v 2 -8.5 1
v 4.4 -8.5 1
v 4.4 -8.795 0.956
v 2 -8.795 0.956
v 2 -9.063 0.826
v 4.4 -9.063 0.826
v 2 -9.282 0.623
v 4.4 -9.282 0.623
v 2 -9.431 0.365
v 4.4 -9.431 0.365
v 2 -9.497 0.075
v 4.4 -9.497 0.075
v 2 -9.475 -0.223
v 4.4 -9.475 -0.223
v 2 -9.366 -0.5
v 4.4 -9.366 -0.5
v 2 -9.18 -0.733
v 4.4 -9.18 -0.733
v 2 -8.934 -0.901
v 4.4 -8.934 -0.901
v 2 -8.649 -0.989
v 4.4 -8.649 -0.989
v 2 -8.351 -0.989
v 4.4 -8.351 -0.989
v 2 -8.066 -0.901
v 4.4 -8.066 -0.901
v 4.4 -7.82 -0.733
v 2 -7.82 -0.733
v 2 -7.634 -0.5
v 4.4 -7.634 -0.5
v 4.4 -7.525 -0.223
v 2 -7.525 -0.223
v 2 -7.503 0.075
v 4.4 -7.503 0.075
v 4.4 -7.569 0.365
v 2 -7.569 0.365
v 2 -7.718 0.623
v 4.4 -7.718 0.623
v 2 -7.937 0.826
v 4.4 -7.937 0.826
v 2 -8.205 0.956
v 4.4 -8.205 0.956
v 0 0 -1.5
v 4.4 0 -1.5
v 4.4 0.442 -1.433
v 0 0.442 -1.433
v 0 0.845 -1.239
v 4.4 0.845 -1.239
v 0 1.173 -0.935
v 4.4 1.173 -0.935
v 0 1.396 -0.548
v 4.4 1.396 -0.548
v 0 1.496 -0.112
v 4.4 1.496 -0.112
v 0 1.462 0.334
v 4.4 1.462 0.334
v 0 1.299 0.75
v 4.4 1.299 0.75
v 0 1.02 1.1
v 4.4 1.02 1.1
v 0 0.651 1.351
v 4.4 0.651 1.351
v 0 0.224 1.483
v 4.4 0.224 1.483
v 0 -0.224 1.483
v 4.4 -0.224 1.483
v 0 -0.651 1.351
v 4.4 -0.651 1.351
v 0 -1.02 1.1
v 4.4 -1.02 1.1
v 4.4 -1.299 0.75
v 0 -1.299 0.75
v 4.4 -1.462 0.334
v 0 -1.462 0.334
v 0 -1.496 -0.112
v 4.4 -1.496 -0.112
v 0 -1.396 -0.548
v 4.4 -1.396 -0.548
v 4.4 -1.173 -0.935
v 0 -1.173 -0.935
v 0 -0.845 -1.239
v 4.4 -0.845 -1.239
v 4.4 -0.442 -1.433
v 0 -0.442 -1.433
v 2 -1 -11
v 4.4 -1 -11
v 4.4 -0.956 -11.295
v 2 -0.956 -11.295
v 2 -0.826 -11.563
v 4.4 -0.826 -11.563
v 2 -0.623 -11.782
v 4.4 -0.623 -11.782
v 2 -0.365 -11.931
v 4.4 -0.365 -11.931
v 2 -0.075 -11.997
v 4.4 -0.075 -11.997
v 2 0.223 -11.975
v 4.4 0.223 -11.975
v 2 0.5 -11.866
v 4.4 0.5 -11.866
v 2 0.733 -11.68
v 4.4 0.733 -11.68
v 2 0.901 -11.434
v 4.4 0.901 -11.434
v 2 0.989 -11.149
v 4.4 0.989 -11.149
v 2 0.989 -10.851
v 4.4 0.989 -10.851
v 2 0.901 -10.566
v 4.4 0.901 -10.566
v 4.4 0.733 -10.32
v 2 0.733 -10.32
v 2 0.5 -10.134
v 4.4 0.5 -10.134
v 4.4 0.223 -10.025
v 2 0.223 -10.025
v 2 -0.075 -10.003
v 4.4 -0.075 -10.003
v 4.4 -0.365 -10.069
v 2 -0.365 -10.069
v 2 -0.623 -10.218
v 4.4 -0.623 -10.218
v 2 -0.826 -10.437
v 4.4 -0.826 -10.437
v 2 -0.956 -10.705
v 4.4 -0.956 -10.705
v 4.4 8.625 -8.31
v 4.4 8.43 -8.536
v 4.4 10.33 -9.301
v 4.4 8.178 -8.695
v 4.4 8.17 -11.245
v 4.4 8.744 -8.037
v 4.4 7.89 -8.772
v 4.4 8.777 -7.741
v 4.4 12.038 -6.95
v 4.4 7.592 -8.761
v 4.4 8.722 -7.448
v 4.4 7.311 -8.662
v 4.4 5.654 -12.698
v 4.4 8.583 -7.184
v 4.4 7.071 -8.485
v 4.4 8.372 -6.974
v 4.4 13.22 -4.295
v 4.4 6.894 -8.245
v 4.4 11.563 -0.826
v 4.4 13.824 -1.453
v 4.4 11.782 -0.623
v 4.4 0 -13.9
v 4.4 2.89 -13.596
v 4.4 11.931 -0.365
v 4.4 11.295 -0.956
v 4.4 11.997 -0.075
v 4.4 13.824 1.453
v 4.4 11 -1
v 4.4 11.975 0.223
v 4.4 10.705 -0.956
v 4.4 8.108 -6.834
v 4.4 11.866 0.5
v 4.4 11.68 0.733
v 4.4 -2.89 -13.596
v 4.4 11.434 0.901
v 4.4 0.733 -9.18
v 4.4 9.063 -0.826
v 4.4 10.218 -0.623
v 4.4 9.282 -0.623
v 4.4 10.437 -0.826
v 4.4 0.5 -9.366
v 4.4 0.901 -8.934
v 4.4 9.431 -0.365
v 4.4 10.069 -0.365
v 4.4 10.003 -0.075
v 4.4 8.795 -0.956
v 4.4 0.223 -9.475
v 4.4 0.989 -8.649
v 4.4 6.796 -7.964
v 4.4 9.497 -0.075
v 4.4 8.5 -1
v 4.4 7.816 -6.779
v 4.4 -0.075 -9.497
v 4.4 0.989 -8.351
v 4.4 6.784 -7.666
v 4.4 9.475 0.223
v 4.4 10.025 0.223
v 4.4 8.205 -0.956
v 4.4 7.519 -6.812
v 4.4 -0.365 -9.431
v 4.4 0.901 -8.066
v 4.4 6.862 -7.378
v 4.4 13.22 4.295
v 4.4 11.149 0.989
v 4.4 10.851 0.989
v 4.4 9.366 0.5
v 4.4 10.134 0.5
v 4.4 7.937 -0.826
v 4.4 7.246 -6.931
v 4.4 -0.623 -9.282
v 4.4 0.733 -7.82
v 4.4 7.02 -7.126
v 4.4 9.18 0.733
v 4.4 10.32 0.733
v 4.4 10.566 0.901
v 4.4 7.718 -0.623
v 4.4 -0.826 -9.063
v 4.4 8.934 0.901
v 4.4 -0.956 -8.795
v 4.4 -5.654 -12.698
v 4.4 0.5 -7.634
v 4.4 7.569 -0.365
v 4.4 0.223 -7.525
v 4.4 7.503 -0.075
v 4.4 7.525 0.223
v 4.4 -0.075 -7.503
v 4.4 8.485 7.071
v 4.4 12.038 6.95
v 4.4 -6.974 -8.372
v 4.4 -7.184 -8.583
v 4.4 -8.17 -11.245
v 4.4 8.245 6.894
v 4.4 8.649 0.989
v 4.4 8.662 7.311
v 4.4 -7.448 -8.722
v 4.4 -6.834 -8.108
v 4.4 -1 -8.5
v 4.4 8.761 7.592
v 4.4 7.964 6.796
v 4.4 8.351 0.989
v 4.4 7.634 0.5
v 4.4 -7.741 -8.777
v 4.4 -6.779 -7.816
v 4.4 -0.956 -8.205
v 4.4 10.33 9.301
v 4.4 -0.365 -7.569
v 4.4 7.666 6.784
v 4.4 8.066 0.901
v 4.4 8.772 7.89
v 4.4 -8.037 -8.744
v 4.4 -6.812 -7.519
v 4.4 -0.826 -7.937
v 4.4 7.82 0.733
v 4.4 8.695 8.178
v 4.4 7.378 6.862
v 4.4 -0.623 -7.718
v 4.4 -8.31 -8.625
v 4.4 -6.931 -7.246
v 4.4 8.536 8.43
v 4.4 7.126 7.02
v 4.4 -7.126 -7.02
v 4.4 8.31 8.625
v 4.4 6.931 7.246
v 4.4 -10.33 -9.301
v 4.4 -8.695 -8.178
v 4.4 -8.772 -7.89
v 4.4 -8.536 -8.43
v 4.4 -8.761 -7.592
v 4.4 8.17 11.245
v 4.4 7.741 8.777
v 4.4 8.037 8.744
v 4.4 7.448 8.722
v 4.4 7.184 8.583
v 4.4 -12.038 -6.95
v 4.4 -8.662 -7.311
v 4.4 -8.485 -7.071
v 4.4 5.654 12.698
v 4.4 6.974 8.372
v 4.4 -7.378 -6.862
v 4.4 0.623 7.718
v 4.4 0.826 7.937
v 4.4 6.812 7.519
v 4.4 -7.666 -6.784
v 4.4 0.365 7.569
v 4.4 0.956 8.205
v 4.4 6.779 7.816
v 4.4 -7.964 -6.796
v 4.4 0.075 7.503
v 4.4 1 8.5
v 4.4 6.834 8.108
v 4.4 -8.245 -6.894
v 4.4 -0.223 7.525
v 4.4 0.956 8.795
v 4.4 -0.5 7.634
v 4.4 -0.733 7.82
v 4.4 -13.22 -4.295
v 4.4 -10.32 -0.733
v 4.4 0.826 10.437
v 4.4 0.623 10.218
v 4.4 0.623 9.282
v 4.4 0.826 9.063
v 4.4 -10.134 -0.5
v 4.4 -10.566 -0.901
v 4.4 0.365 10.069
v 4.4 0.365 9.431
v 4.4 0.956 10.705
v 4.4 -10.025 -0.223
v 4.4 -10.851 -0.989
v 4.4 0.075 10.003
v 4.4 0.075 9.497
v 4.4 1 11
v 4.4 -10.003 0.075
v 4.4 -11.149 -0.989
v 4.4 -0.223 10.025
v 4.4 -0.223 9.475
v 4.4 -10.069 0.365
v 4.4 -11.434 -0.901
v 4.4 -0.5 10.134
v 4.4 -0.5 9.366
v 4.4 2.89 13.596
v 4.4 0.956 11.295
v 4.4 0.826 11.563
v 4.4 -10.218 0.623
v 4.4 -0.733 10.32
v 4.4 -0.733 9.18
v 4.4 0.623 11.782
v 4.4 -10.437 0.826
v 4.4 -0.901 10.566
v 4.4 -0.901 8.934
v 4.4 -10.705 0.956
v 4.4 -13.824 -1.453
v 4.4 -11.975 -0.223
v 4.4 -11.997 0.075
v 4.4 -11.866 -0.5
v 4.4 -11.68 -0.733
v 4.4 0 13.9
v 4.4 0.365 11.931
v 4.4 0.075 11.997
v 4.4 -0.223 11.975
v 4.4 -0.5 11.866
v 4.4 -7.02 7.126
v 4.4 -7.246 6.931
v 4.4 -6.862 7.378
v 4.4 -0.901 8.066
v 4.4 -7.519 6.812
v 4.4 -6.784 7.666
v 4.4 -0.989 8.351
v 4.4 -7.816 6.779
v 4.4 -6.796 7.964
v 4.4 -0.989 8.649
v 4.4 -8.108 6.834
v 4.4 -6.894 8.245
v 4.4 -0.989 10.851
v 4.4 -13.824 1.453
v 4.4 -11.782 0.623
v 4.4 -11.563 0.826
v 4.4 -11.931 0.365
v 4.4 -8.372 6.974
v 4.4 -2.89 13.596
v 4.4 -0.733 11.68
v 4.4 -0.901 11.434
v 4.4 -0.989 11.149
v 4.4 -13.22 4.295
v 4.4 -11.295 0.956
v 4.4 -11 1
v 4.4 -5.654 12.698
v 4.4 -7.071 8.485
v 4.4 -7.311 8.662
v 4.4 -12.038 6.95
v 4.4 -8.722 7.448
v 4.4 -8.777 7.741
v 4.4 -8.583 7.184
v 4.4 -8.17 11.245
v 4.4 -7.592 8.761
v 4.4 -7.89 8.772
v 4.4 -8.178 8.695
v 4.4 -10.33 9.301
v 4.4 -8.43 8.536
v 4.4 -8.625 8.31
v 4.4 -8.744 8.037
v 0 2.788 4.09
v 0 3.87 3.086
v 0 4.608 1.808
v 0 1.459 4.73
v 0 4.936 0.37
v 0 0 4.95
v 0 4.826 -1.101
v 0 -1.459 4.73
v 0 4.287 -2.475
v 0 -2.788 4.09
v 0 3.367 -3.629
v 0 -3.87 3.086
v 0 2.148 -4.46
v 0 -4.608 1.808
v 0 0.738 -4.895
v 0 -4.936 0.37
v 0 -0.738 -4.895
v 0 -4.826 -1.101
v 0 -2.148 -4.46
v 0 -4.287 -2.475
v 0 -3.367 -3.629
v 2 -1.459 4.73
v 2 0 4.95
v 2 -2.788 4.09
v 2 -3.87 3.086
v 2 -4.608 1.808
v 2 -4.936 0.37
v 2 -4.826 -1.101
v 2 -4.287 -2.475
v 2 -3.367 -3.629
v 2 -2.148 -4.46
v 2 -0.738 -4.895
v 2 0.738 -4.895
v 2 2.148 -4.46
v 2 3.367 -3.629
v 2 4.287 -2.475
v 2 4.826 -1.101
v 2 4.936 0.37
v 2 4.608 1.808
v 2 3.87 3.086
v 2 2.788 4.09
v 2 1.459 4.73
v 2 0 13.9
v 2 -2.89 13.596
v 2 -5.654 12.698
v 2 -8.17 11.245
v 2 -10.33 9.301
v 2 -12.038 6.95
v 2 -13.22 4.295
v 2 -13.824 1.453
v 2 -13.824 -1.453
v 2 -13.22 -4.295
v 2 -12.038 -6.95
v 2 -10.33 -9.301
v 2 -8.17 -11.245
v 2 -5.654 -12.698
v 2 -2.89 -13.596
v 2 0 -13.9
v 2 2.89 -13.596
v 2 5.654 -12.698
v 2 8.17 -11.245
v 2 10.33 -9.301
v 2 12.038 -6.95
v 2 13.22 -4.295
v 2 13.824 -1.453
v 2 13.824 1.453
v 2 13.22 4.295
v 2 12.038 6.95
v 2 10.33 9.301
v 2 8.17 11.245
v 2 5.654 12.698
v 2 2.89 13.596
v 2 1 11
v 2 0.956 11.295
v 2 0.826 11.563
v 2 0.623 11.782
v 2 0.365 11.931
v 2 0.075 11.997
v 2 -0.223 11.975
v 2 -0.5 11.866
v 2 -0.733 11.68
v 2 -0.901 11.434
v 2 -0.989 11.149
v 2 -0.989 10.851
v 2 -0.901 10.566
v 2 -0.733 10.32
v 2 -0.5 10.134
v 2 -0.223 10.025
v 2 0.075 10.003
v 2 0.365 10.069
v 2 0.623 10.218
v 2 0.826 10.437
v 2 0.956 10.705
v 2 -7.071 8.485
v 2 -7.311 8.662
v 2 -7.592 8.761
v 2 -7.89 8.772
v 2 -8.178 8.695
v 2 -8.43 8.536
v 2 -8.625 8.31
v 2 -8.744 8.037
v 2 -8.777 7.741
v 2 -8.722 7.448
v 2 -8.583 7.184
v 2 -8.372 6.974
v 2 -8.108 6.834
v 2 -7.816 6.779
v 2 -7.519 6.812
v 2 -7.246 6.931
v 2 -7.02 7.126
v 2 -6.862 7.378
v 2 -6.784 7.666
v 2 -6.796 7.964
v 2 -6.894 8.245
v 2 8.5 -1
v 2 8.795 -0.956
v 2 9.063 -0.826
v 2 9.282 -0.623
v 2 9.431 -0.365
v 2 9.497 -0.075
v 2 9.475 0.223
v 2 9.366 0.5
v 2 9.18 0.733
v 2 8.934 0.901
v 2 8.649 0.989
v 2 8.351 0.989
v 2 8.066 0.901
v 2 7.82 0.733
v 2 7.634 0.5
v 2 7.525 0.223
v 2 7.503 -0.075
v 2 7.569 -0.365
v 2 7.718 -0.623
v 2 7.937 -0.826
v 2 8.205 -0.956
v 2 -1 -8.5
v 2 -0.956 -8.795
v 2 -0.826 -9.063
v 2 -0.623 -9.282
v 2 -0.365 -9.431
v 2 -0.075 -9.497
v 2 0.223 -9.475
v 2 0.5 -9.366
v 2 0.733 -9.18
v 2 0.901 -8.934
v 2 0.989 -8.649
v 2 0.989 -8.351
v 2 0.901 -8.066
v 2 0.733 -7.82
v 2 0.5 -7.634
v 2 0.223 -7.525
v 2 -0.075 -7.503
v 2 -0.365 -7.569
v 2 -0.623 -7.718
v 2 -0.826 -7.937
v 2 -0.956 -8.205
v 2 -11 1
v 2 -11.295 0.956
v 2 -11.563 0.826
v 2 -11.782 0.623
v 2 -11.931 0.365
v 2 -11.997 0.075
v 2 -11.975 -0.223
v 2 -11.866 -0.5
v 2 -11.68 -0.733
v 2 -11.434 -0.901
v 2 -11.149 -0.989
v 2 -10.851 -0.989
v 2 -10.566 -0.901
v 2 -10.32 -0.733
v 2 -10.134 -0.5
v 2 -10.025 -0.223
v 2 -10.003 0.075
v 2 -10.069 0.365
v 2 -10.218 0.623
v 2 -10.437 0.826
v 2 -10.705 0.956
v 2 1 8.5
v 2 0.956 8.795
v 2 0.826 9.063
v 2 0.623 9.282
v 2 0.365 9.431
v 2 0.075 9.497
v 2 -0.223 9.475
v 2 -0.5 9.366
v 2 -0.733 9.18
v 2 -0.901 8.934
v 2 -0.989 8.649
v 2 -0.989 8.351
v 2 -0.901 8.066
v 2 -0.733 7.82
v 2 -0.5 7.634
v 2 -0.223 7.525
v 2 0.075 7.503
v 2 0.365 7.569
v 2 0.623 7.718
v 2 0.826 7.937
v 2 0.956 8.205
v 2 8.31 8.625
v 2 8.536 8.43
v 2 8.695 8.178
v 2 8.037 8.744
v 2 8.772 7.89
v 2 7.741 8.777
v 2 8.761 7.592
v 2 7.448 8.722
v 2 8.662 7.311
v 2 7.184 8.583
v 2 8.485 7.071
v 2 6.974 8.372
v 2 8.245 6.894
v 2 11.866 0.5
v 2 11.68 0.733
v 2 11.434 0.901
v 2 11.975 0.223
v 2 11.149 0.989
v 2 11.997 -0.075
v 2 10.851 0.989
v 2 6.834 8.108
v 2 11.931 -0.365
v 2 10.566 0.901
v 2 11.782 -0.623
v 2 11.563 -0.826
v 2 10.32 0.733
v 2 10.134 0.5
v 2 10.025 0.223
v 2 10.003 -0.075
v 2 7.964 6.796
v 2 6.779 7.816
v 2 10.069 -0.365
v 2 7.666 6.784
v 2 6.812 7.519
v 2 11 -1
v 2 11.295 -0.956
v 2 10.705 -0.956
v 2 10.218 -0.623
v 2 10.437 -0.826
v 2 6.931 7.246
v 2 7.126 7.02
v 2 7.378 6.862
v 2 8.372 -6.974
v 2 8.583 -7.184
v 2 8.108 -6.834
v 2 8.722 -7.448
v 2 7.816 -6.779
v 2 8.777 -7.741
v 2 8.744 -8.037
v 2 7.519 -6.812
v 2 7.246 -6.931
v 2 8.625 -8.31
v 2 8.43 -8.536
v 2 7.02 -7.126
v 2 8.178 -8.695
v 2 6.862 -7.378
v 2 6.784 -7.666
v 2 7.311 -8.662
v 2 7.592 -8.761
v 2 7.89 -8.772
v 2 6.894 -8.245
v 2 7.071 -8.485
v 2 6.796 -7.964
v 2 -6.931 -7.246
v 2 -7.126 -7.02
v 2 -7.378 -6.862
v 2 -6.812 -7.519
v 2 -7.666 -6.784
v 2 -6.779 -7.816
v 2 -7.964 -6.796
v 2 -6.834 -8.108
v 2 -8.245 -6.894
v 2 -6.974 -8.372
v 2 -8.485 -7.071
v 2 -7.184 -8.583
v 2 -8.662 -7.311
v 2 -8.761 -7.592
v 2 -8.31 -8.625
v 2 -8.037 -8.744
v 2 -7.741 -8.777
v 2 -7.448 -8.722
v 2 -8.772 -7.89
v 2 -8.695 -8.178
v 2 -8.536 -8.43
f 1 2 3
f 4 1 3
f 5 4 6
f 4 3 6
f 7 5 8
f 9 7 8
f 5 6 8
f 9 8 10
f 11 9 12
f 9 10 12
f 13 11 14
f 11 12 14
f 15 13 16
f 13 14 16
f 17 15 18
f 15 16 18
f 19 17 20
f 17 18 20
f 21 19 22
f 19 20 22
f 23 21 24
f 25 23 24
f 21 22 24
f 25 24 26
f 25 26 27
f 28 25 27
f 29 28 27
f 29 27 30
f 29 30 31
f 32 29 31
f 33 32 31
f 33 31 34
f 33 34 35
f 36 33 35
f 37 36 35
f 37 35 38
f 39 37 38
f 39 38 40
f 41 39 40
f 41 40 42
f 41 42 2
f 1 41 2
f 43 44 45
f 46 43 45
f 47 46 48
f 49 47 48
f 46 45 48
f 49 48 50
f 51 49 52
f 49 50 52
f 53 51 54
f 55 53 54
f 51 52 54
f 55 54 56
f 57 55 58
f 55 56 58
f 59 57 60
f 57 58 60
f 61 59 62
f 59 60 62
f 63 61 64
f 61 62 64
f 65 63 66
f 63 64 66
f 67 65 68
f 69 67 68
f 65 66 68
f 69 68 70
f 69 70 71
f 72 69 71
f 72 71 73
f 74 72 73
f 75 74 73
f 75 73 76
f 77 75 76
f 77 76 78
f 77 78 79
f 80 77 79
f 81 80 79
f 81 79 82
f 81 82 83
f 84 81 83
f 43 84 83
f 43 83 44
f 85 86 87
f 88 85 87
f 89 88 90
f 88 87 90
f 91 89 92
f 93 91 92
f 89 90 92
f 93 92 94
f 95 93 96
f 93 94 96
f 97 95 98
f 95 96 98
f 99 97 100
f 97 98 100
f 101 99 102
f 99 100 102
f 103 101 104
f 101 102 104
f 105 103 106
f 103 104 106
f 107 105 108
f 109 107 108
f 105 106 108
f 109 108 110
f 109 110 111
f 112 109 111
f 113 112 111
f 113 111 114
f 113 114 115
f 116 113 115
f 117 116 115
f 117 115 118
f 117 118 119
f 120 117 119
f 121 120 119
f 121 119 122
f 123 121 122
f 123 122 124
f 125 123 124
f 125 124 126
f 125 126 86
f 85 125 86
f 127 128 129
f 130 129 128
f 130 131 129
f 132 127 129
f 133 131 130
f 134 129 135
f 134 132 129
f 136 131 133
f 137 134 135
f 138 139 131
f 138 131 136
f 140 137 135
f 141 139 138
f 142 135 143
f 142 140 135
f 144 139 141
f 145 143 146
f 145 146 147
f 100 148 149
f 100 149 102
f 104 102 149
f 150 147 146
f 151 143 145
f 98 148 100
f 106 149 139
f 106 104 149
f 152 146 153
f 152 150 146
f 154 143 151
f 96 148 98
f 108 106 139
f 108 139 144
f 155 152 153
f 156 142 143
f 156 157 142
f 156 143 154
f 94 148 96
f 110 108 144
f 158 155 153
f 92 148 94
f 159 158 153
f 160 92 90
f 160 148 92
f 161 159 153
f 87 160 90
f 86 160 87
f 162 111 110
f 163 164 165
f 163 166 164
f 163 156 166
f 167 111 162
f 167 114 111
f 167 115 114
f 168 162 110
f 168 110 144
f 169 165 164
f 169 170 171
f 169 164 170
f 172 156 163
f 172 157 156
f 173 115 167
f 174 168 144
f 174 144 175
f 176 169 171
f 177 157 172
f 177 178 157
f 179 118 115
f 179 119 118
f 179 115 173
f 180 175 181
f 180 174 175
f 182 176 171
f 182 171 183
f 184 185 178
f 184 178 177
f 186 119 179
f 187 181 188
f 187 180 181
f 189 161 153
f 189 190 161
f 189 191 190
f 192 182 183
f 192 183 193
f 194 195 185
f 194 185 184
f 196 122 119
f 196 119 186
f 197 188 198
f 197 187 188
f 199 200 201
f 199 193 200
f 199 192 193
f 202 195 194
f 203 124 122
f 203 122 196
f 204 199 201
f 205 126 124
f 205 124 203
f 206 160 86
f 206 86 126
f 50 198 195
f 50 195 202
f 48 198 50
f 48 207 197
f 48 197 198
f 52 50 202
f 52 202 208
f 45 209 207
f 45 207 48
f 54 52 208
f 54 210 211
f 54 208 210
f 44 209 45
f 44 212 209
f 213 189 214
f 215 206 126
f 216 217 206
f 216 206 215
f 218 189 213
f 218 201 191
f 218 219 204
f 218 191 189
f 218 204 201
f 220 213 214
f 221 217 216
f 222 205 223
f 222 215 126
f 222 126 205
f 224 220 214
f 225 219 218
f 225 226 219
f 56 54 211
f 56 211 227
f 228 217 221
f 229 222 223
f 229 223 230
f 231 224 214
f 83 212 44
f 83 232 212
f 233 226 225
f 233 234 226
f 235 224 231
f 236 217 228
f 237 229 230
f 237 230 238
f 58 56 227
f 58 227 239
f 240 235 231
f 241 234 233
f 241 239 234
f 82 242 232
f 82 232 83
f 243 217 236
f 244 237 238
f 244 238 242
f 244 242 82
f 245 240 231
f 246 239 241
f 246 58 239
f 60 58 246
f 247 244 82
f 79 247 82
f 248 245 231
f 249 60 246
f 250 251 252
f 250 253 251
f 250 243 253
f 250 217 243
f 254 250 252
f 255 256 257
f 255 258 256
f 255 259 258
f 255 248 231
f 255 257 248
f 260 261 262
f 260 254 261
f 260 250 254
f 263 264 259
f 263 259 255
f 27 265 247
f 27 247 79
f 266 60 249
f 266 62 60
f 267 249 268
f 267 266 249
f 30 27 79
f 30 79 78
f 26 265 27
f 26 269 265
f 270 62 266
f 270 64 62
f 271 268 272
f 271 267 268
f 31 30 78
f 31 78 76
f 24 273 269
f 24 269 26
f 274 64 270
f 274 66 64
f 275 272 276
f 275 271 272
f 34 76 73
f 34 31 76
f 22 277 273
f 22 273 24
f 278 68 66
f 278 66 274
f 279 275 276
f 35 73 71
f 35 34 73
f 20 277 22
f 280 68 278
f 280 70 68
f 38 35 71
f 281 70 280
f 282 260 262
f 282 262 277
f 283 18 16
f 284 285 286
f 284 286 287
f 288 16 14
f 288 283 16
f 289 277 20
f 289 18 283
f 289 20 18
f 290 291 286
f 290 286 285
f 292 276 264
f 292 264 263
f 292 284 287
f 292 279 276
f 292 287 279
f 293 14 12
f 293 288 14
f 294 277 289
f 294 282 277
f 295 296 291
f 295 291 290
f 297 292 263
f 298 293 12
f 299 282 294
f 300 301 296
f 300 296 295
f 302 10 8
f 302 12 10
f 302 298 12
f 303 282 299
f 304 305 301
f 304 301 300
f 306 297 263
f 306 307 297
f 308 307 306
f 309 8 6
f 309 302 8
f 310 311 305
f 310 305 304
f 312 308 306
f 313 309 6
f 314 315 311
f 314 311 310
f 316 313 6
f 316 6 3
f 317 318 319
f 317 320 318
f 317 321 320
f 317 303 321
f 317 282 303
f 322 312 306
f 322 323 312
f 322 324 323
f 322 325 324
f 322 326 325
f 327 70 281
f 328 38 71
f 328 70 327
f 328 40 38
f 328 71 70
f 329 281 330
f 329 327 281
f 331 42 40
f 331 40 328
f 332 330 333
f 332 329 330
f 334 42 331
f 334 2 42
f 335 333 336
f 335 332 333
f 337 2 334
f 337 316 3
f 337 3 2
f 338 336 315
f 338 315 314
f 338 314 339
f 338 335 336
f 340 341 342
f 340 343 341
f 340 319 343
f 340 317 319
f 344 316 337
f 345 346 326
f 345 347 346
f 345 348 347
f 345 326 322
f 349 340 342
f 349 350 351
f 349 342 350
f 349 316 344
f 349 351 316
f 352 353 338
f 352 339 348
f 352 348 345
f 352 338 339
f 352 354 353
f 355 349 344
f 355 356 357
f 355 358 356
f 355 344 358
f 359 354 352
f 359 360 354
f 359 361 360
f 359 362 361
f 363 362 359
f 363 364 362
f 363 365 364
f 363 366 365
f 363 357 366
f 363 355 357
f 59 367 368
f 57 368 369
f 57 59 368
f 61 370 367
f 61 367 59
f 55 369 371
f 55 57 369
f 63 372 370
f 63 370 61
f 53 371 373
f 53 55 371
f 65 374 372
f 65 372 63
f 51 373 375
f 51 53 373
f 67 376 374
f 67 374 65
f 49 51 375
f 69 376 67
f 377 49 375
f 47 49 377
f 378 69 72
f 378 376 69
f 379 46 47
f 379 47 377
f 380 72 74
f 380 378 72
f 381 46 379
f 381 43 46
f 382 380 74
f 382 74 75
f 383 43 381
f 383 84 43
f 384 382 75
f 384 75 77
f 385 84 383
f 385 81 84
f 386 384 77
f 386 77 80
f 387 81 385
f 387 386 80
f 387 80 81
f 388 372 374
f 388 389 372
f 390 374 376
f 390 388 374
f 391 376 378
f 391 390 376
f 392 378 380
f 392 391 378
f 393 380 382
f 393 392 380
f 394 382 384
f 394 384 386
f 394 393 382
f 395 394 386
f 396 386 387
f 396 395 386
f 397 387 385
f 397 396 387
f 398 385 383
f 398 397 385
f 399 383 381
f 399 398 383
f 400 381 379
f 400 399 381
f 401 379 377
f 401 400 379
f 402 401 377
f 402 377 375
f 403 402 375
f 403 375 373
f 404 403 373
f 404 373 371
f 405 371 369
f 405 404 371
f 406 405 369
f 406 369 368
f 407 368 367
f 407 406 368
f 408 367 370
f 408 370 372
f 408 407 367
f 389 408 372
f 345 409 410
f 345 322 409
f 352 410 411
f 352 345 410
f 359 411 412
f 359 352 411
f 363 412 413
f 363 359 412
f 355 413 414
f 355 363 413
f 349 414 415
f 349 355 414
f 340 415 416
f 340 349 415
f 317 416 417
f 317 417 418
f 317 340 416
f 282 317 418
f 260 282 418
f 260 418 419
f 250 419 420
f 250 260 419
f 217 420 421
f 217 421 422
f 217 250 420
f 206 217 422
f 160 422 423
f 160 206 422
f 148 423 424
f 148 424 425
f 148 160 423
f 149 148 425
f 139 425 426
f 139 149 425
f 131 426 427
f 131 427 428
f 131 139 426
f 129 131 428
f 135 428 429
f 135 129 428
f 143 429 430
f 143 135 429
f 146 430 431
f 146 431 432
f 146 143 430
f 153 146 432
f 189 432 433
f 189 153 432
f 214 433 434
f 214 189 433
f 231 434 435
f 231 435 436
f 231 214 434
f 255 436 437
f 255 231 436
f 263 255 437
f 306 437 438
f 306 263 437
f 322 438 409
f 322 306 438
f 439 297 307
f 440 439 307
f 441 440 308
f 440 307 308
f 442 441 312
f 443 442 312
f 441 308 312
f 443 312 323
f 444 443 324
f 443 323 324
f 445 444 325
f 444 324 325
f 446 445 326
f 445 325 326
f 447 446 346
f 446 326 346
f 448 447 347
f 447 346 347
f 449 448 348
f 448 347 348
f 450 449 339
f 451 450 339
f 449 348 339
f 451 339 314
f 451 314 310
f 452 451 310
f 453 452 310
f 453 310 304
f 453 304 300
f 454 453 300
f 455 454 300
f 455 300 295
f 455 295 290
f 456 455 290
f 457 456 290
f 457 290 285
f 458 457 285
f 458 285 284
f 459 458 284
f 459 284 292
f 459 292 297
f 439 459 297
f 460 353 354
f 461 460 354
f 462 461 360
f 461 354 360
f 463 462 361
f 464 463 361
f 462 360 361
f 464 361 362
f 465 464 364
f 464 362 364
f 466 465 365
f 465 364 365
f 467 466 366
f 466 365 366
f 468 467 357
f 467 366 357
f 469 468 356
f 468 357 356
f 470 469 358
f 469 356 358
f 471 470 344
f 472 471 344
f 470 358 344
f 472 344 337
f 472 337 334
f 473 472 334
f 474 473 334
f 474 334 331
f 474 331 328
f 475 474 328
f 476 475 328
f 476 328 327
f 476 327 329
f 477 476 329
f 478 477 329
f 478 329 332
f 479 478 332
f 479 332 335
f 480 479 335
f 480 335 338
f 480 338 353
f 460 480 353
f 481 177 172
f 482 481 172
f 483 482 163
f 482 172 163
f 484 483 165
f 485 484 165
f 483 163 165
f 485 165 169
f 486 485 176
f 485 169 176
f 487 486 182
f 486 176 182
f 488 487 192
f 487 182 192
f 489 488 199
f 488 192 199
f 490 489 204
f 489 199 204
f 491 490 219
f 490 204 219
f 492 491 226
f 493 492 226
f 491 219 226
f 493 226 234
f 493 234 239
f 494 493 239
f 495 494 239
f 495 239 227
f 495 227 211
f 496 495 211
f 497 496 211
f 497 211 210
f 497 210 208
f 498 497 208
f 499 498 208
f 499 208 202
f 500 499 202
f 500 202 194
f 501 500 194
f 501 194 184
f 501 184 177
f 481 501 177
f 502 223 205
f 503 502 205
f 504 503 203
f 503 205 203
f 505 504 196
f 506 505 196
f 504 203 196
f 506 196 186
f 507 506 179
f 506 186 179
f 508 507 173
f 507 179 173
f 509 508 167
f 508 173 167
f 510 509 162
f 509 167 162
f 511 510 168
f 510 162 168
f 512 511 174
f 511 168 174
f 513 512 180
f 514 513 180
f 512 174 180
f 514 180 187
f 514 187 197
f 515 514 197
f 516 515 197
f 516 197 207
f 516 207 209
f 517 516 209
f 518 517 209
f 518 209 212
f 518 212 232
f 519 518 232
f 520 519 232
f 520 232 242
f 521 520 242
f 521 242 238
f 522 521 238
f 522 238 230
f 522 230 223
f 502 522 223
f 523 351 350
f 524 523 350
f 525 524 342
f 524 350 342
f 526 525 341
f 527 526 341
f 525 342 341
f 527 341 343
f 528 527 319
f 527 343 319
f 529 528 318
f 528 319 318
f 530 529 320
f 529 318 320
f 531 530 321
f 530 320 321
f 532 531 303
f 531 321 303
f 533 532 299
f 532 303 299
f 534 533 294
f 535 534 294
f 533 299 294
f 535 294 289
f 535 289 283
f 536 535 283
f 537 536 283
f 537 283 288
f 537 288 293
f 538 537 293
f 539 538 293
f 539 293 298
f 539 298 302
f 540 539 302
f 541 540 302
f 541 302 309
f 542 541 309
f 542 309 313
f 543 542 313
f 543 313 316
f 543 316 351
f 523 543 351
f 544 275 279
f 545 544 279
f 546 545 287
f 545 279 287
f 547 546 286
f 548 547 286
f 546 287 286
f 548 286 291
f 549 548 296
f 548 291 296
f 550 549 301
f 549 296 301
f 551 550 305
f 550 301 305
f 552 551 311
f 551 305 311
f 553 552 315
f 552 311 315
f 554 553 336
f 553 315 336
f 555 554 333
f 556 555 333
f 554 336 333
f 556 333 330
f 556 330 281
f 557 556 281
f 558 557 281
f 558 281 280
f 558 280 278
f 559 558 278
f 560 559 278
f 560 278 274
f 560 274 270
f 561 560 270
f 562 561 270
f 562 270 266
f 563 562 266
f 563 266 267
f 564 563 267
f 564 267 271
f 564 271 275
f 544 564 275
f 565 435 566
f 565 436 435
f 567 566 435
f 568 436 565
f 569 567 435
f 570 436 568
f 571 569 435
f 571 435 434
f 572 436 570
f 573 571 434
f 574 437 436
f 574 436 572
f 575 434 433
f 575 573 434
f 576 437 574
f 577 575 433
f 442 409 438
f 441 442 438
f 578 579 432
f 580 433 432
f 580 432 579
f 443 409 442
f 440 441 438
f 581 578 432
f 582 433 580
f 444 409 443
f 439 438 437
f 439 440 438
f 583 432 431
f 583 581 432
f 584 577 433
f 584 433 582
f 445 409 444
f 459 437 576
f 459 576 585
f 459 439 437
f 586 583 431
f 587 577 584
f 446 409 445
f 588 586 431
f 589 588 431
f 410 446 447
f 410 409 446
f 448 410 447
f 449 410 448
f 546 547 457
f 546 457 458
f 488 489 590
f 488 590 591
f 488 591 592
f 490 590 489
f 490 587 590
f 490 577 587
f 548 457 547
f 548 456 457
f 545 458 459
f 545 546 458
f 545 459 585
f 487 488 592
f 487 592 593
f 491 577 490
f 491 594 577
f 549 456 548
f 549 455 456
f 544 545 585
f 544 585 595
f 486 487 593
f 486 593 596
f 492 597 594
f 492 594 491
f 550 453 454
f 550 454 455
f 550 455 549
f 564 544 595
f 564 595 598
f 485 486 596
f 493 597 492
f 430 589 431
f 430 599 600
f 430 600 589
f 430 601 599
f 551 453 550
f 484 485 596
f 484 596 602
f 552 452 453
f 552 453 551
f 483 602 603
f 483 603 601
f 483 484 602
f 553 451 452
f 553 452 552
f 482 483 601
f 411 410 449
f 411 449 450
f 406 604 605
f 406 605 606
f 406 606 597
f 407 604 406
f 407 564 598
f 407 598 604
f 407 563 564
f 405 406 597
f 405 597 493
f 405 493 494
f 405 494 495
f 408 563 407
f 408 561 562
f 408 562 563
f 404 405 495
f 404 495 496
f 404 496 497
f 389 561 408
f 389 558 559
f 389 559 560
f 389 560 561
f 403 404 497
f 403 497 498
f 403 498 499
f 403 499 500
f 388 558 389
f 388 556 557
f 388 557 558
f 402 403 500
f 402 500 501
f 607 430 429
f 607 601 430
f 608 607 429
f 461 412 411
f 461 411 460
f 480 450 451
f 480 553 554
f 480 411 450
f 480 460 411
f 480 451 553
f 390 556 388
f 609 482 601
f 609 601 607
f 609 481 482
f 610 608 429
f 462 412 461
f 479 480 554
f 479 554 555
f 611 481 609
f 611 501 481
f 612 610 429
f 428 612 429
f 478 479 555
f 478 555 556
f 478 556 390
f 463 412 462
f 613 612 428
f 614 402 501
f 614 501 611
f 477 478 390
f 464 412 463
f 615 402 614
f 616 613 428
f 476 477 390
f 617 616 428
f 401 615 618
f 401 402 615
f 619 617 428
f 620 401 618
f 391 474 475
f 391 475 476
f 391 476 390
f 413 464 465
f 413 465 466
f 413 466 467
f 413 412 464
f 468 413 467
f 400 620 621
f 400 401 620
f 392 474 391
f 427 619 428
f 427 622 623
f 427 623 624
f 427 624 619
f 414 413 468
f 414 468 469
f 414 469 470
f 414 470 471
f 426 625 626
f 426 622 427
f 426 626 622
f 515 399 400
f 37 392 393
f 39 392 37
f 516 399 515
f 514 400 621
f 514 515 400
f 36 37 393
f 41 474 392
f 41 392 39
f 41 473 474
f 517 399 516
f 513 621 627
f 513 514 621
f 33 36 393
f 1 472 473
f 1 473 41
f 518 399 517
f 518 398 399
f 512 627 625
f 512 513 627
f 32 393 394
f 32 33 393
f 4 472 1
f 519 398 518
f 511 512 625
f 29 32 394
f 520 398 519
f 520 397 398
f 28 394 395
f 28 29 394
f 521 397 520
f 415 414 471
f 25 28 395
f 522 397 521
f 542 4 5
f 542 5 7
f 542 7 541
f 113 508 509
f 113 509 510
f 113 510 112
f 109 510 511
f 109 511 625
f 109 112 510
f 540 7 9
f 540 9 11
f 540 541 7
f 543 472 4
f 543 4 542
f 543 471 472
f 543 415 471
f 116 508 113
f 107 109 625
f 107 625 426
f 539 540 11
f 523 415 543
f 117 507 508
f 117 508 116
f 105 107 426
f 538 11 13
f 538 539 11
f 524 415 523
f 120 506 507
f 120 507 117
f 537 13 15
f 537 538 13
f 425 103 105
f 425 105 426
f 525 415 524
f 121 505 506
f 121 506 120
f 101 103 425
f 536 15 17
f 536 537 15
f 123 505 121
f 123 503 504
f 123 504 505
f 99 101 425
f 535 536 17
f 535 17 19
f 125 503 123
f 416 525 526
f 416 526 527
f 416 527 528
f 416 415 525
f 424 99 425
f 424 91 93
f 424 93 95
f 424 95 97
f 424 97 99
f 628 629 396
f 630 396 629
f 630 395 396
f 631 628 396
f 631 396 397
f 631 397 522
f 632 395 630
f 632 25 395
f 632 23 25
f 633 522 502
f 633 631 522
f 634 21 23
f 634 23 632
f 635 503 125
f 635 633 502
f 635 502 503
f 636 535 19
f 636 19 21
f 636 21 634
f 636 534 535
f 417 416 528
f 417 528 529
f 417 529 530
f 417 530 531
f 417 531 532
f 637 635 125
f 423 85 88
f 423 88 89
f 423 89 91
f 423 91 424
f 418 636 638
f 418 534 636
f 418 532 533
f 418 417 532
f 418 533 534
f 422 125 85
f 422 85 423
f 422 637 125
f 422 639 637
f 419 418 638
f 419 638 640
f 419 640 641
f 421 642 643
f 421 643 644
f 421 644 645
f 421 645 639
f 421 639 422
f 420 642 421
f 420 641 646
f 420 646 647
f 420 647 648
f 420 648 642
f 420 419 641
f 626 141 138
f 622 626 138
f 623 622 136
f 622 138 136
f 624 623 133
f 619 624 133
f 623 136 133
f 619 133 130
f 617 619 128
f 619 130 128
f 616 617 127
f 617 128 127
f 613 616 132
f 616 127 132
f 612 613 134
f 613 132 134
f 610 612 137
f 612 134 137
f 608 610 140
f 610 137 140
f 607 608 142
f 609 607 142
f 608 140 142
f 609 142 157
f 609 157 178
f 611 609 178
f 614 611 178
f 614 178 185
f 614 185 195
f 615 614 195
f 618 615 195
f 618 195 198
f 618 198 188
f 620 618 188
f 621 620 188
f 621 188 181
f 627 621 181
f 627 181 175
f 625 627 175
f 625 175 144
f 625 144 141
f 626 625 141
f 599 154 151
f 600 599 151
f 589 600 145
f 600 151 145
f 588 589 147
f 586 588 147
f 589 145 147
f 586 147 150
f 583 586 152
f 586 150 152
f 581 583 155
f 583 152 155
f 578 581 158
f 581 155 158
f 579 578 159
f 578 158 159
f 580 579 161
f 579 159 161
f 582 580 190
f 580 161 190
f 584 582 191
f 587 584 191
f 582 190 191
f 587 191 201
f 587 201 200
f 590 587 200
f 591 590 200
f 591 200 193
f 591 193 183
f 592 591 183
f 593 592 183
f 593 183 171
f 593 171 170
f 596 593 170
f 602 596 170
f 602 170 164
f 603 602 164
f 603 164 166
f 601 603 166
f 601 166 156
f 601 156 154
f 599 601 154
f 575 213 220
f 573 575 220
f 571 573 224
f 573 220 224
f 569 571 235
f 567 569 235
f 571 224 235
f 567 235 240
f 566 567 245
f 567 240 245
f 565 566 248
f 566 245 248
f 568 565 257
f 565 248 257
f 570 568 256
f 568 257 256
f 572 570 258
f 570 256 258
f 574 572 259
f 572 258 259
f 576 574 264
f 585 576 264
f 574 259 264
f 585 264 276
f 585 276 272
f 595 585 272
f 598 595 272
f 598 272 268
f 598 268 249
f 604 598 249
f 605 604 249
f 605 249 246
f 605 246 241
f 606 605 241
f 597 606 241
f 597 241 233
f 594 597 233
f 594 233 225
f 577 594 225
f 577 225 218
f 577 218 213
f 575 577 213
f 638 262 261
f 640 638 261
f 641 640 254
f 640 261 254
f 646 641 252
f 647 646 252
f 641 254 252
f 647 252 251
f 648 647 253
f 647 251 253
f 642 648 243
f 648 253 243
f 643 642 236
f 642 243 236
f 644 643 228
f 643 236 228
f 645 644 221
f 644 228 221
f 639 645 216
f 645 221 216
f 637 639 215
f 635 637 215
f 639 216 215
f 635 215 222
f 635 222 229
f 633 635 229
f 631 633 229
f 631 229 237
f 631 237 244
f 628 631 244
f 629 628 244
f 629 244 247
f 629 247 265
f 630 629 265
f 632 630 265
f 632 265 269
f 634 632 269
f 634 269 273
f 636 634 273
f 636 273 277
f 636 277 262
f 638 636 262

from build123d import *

# Parameters (mm, degrees)
SKETCH2_R          = 1
CUT_EXTRUDE1_DEPTH = 10
SKETCH3_R          = 1
CUT_EXTRUDE2_DEPTH = 10
CIRPATTERN1_COUNT  = 8
CIRPATTERN2_COUNT  = 4
SKETCH5_R          = 1.5
CUT_EXTRUDE3_DEPTH = 10


with BuildPart() as part:
    # Sketch1 → Revolve1 (revolve)
    with BuildSketch(Plane.XY, mode=Mode.PRIVATE) as revolve1_sk:
        Polygon((0, 0), (0, 4.95), (2, 4.95), (2, 13.9), (4.4, 13.9), (4.4, 0), align=None)
    revolve(revolve1_sk.sketch.rotate(Axis((0, 0, 0), (1, 0, 0)), 90), axis=Axis((0, 0, 0), (1, 0, 0)))

    # Sketch2 → Cut-Extrude1 (cut)
    with BuildSketch(Plane(origin=(4.4, 0, 0), x_dir=(0, 0, -1), z_dir=(1, 0, 0))):
        with Locations((0, 11)):
            Circle(SKETCH2_R)
    cut_extrude1 = extrude(amount=-CUT_EXTRUDE1_DEPTH, mode=Mode.SUBTRACT)

    # Sketch3 → Cut-Extrude2 (cut)
    with BuildSketch(Plane(origin=(4.4, 0, 0), x_dir=(0, 0, -1), z_dir=(1, 0, 0))):
        with Locations((0, 8.5)):
            Circle(SKETCH3_R)
    cut_extrude2 = extrude(amount=-CUT_EXTRUDE2_DEPTH, mode=Mode.SUBTRACT)

    # CirPattern1: Cut-Extrude1 ×8 about axis
    cirpattern1_axis = Axis((0, 0, 0), (1, 0, 0))
    for i in range(1, CIRPATTERN1_COUNT):
        add(cut_extrude1.rotate(cirpattern1_axis, i * 360 / CIRPATTERN1_COUNT), mode=Mode.SUBTRACT)

    # CirPattern2: Cut-Extrude2 ×4 about axis
    cirpattern2_axis = Axis((0, 0, 0), (1, 0, 0))
    for i in range(1, CIRPATTERN2_COUNT):
        add(cut_extrude2.rotate(cirpattern2_axis, i * 360 / CIRPATTERN2_COUNT), mode=Mode.SUBTRACT)

    # Sketch5 → Cut-Extrude3 (cut)
    with BuildSketch(Plane(origin=(4.4, 0, 0), x_dir=(0, 0, -1), z_dir=(1, 0, 0))):
        Circle(SKETCH5_R)
    extrude(amount=-CUT_EXTRUDE3_DEPTH, mode=Mode.SUBTRACT)


solid = part.part
